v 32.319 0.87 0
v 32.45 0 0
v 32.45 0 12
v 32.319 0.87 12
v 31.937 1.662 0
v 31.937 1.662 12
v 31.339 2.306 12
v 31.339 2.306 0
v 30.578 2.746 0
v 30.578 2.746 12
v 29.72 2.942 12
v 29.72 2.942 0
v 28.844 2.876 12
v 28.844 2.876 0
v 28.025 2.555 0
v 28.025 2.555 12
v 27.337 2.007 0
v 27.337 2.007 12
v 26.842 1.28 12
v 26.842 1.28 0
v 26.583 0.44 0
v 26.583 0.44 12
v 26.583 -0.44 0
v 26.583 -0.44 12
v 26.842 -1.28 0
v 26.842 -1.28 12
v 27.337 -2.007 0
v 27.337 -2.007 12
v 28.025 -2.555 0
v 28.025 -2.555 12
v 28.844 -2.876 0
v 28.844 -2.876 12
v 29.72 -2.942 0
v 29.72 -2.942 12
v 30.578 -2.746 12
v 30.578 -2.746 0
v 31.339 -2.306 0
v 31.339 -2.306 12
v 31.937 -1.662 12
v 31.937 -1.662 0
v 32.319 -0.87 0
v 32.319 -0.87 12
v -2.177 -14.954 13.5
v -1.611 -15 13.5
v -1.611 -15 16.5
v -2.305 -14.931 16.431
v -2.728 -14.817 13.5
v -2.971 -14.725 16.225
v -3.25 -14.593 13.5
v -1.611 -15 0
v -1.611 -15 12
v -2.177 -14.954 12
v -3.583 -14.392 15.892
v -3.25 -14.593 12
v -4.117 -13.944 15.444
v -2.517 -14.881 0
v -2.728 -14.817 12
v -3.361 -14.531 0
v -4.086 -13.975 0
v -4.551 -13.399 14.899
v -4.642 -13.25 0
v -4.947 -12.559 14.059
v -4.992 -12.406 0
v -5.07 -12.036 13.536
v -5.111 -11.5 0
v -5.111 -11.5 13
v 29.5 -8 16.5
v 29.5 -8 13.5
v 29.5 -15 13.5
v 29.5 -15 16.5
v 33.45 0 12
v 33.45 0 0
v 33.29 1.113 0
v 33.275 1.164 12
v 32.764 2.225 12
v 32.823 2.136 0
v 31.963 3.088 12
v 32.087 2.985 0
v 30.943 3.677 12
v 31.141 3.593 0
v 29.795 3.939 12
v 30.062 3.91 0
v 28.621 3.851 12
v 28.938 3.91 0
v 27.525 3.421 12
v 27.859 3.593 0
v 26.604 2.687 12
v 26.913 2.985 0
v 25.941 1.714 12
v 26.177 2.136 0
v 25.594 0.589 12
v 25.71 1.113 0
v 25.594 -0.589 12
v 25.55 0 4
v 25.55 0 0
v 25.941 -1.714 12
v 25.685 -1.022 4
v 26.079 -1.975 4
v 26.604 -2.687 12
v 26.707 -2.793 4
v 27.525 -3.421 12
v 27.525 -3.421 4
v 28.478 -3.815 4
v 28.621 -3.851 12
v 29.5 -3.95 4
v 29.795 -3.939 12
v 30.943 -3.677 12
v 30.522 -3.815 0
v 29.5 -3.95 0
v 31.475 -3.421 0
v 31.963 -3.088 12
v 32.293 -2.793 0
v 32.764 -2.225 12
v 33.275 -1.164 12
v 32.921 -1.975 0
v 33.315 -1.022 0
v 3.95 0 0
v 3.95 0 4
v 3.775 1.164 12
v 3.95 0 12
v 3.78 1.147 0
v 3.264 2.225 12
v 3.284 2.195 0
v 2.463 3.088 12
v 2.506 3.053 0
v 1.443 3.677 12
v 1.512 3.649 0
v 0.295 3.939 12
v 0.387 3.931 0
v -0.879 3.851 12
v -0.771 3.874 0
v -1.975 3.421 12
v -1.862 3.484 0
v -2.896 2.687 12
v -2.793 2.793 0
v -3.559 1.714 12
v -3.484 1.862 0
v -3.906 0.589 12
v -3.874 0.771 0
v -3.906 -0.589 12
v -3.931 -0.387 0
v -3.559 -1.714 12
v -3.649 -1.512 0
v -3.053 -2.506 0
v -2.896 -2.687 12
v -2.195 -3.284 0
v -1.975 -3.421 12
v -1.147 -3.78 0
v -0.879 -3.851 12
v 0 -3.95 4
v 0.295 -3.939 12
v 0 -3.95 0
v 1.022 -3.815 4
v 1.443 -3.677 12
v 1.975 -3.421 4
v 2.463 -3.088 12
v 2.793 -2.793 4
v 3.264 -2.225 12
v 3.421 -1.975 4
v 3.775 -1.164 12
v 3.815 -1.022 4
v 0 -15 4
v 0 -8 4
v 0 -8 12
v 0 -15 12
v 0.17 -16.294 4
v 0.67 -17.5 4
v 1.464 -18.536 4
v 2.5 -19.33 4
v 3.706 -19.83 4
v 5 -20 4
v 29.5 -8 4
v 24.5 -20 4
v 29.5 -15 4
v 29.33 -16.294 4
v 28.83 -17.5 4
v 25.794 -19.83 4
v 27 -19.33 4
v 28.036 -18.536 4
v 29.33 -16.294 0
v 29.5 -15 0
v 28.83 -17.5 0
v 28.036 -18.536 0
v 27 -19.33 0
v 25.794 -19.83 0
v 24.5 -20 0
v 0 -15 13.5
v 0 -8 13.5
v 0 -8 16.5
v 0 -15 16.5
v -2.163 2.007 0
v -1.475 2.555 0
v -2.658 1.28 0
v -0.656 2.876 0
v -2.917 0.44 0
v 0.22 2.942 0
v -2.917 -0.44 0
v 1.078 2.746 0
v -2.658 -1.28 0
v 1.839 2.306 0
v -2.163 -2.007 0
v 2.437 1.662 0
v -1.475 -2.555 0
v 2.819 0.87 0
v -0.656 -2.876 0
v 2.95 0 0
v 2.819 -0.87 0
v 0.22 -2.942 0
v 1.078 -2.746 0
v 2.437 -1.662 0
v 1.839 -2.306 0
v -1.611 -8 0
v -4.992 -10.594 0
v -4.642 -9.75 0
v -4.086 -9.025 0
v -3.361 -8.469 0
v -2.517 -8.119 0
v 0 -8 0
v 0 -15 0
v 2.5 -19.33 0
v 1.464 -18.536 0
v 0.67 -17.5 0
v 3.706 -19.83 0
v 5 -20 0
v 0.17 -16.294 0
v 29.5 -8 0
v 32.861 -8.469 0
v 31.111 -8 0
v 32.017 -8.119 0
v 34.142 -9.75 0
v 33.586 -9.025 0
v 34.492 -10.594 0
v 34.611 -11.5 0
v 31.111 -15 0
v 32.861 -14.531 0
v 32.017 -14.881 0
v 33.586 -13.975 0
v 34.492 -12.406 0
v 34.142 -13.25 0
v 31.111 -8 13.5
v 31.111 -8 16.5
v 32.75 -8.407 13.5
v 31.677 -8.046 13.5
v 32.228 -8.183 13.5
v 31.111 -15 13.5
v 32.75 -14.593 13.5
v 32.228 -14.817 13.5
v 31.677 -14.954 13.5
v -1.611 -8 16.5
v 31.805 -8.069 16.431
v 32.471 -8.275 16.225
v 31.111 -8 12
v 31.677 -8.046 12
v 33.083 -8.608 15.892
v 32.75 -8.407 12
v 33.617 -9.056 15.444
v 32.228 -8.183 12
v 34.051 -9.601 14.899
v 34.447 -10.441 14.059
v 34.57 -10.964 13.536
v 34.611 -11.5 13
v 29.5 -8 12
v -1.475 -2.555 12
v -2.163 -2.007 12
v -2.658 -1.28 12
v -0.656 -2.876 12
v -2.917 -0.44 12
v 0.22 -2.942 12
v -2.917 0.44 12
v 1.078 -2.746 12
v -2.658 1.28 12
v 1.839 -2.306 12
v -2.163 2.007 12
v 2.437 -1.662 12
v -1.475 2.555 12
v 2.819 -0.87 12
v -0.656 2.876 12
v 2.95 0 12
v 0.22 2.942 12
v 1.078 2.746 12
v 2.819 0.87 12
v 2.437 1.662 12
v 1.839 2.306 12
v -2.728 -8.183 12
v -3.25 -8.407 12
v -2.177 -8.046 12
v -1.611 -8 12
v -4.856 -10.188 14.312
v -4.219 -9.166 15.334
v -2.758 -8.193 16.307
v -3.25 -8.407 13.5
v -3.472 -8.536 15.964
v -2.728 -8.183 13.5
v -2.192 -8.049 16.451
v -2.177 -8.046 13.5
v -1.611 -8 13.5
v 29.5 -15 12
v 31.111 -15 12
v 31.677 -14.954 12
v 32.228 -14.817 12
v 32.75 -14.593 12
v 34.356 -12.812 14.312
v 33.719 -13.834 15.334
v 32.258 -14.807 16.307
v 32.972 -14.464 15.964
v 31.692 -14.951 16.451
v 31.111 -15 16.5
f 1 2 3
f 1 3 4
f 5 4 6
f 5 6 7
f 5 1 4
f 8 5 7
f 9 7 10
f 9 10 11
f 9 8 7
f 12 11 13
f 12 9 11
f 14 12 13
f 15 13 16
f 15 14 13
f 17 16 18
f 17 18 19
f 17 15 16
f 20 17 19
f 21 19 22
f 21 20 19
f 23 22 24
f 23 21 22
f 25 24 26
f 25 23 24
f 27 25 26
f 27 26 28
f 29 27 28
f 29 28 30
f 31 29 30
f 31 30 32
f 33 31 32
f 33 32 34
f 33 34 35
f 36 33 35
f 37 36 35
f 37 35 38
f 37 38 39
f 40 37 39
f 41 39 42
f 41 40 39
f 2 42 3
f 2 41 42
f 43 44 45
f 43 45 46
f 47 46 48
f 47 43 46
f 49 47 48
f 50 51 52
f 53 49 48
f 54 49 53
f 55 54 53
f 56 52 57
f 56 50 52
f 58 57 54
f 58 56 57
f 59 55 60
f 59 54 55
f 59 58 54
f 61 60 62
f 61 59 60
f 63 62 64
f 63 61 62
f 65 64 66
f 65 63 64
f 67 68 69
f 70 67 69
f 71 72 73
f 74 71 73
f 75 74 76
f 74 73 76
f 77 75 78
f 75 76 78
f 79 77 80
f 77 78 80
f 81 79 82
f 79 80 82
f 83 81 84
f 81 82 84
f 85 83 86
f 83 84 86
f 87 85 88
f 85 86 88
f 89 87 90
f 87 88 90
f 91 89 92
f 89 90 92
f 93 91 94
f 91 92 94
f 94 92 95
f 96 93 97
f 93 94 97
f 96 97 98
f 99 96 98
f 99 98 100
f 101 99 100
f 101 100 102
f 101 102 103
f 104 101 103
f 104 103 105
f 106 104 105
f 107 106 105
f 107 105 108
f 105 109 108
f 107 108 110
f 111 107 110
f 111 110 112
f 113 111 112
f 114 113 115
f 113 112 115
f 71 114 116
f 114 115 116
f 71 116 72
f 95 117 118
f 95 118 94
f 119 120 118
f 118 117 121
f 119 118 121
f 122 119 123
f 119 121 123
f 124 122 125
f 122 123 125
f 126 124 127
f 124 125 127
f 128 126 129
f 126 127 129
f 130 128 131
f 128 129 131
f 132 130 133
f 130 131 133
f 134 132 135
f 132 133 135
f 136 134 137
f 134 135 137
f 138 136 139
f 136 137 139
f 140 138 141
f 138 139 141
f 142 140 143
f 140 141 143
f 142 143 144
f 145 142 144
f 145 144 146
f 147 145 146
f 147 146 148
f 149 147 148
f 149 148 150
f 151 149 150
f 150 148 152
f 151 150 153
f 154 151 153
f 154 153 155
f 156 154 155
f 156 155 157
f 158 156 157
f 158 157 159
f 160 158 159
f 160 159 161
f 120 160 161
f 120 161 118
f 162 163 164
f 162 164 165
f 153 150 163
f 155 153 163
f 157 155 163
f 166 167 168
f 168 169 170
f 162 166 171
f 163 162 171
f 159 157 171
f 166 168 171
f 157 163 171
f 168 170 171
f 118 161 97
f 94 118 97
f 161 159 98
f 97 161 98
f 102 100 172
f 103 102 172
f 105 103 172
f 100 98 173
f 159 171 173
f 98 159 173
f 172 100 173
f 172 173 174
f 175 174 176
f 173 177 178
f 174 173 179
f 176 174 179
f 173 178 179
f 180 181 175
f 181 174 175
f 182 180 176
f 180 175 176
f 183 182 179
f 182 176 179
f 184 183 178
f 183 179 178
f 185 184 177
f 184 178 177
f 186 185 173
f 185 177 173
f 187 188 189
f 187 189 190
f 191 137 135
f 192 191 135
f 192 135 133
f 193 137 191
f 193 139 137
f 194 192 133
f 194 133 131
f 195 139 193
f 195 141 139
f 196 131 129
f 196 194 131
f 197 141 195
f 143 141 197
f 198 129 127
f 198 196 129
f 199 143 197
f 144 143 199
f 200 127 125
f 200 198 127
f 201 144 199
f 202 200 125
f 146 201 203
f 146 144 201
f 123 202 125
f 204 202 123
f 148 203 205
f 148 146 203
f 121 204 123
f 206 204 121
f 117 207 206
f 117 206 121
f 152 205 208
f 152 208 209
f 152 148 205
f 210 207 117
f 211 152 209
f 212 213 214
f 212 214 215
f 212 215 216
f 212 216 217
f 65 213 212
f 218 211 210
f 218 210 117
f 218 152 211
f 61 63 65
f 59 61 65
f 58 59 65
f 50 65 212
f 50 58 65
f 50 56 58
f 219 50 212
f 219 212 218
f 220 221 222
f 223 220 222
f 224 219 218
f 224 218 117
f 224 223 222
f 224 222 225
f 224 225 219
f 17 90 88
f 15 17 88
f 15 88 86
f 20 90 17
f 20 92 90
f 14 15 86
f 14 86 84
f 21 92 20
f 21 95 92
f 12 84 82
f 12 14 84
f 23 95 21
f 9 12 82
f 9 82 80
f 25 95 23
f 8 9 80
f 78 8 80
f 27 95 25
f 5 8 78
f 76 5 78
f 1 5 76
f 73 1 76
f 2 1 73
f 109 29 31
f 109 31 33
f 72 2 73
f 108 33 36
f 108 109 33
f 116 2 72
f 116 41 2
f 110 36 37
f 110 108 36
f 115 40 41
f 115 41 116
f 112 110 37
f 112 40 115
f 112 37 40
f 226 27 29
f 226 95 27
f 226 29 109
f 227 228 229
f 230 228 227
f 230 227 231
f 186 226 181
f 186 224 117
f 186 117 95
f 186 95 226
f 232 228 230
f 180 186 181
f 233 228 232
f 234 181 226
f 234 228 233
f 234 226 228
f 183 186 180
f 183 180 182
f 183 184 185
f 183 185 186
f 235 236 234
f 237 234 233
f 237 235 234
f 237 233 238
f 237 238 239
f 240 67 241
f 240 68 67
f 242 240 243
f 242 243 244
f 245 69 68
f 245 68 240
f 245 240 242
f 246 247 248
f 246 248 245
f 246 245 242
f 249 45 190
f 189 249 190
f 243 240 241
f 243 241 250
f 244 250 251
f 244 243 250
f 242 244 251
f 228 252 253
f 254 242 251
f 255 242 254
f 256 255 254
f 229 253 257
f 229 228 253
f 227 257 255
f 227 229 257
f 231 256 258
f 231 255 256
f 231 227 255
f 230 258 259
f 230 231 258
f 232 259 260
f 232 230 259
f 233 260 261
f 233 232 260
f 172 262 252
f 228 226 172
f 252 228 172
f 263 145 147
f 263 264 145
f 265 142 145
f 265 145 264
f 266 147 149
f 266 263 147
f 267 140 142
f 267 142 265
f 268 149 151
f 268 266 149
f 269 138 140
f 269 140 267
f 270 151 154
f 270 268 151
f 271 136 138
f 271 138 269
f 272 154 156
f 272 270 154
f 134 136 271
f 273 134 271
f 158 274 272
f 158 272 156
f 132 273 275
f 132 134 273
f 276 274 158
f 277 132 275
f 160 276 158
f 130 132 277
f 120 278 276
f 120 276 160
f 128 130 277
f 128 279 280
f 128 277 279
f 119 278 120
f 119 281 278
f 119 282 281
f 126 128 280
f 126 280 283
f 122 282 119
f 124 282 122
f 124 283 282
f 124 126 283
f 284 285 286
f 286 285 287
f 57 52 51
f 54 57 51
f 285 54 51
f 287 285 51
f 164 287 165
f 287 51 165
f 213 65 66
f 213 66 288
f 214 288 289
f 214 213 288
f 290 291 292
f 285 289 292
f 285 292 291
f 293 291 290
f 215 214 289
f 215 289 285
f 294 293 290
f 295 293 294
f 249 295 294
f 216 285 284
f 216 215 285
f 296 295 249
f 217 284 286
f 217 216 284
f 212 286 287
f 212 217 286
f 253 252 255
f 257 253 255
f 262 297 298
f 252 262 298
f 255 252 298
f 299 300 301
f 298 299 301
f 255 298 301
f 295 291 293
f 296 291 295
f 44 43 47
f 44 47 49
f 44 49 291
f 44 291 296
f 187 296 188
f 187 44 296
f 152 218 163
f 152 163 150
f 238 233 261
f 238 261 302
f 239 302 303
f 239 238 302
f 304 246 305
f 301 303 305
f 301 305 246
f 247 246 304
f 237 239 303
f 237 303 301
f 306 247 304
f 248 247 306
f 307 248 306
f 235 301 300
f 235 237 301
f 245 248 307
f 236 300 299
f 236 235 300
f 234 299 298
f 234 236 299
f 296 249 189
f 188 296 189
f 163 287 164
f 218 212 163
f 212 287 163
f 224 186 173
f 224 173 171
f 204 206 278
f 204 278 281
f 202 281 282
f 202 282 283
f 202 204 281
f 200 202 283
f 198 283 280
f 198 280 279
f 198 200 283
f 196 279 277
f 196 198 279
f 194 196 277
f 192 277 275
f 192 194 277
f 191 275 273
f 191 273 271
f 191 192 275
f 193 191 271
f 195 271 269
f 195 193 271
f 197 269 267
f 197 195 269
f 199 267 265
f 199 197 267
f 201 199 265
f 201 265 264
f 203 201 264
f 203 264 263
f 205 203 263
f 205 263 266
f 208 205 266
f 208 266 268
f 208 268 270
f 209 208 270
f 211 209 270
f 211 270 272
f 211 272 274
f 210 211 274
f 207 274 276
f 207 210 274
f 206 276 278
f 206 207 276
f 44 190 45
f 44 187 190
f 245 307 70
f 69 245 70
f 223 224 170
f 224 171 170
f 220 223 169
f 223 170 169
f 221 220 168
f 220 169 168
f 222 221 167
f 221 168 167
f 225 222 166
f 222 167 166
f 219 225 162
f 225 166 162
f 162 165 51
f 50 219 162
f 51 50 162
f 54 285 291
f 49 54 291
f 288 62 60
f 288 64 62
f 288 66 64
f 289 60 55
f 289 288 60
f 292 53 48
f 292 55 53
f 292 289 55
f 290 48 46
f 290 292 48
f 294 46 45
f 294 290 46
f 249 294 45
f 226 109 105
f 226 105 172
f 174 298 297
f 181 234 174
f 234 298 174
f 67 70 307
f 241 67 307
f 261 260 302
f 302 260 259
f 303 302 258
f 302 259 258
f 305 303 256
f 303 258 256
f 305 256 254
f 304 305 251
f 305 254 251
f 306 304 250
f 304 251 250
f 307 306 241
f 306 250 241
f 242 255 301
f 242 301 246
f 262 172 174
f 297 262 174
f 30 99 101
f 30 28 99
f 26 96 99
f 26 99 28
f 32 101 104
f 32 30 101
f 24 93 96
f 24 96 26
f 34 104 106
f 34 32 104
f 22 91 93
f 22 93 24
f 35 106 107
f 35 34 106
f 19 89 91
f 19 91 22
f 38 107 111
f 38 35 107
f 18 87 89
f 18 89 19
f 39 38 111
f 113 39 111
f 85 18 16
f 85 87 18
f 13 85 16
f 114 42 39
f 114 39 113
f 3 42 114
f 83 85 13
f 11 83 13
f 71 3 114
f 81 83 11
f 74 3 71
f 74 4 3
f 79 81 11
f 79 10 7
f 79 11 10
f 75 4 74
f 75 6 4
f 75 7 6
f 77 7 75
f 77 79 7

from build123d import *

# Parameters (mm, degrees)
F0_R         = 3.95
F0_R_2       = 2.95
F1_DEPTH     = 12
F3_DEPTH     = 4
F5_R         = 5
F6_W         = 3
F6_H         = 7
F6_W_2       = 2.1112600537
F7_DEPTH     = 16.5
F8_W         = 3.25
F8_H         = 1.5
F9_DEPTH     = 7
F10_T1_DEPTH = 34
F10_T3_DEPTH = 24.5


# Not quite as in the source:
# - a fillet or chamfer that OpenCascade refuses, or shapes differently, is made with other operations: its cross-section is extruded or revolved along the edge and cut away or added


with BuildPart() as f1:
    # F0 (on Top) → F1 (new body)
    with BuildSketch(Plane.XY):
        Circle(F0_R)
        Circle(F0_R_2, mode=Mode.SUBTRACT)
    extrude(amount=F1_DEPTH)


with BuildPart() as f1b:
    # F0 (on Top) → F1, piece 2 (new body)
    with BuildSketch(Plane.XY):
        with Locations((29.5, 0)):
            Circle(F0_R)
        with Locations((29.5, 0)):
            Circle(F0_R_2, mode=Mode.SUBTRACT)
    extrude(amount=F1_DEPTH)


with BuildPart() as f3:
    # F2 (on face) → F3 (new body)
    with BuildSketch(Plane(origin=(0, 0, 0), x_dir=(1, 0, 0), z_dir=(0, 0, -1))):
        with BuildLine():
            ThreePointArc((0, 3.95), (2.7930717857, 2.7930717857), (3.95, 0))
            Line((3.95, 0), (25.55, 0))
            ThreePointArc((25.55, 0), (26.7069282143, 2.7930717857), (29.5, 3.95))
            Line((29.5, 3.95), (29.5, 20))
            Line((29.5, 20), (0, 20))
            Line((0, 20), (0, 3.95))
        make_face()
    extrude(amount=-F3_DEPTH)

    # F4: union F1, F1b
    add(f1.part)
    add(f1b.part)

    # F5
    f5_edges = [f3.edges().sort_by_distance(p)[0] for p in [
        (0, -20, 2),
        (29.5, -20, 2),
    ]]
    fillet(f5_edges, radius=F5_R)

    # F6 (on face) → F7 (join)
    with BuildSketch(Plane(origin=(0, 0, 0), x_dir=(1, 0, 0), z_dir=(0, 0, -1))):
        with Locations((-3.6112600537, 11.5)):
            Rectangle(F6_W, F6_H)
        with Locations((-1.0556300269, 11.5)):
            Rectangle(F6_W_2, F6_H)
        with Locations((30.5556300269, 11.5)):
            Rectangle(F6_W_2, F6_H)
        with Locations((33.1112600537, 11.5)):
            Rectangle(F6_W, F6_H)
    extrude(amount=-F7_DEPTH)

    # F8 (on face) → F9 (cut, through all)
    with BuildSketch(Plane.XZ.offset(15)):
        with Locations((-1.625, 12.75)):
            Rectangle(F8_W, F8_H)
        with Locations((31.125, 12.75)):
            Rectangle(F8_W, F8_H)
    extrude(amount=-F9_DEPTH, mode=Mode.SUBTRACT)

    # F10: fillet of radius 3.5 on 6 edges, made by hand

    # F10_s2 → F10_t1 (cut)
    with BuildSketch(Plane.XY.offset(-8.75)):
        with BuildLine():
            ThreePointArc((-1.6112600537, -15), (-4.0861337879, -13.9748737342), (-5.1112600537, -11.5))
            Line((-5.1112600537, -11.5), (-5.1112600537, -15))
            Line((-5.1112600537, -15), (-1.6112600537, -15))
        make_face()
        with BuildLine():
            ThreePointArc((-5.1112600537, -11.5), (-4.0861337879, -9.0251262658), (-1.6112600537, -8))
            Line((-1.6112600537, -8), (-5.1112600537, -8))
            Line((-5.1112600537, -8), (-5.1112600537, -11.5))
        make_face()
        with BuildLine():
            ThreePointArc((34.6112600537, -11.5), (33.5861337879, -13.9748737342), (31.1112600537, -15))
            Line((31.1112600537, -15), (34.6112600537, -15))
            Line((34.6112600537, -15), (34.6112600537, -11.5))
        make_face()
        with BuildLine():
            ThreePointArc((31.1112600537, -8), (33.5861337879, -9.0251262658), (34.6112600537, -11.5))
            Line((34.6112600537, -11.5), (34.6112600537, -8))
            Line((34.6112600537, -8), (31.1112600537, -8))
        make_face()
    extrude(amount=F10_T1_DEPTH, mode=Mode.SUBTRACT)

    # F10_s4 → F10_t3 (cut)
    with BuildSketch(Plane.XZ.offset(-0.75)):
        with BuildLine():
            ThreePointArc((34.6112600537, 13), (33.5861337879, 15.4748737342), (31.1112600537, 16.5))
            Line((31.1112600537, 16.5), (34.6112600537, 16.5))
            Line((34.6112600537, 16.5), (34.6112600537, 13))
        make_face()
        with BuildLine():
            ThreePointArc((-5.1112600537, 13), (-4.0861337879, 15.4748737342), (-1.6112600537, 16.5))
            Line((-1.6112600537, 16.5), (-5.1112600537, 16.5))
            Line((-5.1112600537, 16.5), (-5.1112600537, 13))
        make_face()
    extrude(amount=F10_T3_DEPTH, mode=Mode.SUBTRACT)


solid = f3.part
